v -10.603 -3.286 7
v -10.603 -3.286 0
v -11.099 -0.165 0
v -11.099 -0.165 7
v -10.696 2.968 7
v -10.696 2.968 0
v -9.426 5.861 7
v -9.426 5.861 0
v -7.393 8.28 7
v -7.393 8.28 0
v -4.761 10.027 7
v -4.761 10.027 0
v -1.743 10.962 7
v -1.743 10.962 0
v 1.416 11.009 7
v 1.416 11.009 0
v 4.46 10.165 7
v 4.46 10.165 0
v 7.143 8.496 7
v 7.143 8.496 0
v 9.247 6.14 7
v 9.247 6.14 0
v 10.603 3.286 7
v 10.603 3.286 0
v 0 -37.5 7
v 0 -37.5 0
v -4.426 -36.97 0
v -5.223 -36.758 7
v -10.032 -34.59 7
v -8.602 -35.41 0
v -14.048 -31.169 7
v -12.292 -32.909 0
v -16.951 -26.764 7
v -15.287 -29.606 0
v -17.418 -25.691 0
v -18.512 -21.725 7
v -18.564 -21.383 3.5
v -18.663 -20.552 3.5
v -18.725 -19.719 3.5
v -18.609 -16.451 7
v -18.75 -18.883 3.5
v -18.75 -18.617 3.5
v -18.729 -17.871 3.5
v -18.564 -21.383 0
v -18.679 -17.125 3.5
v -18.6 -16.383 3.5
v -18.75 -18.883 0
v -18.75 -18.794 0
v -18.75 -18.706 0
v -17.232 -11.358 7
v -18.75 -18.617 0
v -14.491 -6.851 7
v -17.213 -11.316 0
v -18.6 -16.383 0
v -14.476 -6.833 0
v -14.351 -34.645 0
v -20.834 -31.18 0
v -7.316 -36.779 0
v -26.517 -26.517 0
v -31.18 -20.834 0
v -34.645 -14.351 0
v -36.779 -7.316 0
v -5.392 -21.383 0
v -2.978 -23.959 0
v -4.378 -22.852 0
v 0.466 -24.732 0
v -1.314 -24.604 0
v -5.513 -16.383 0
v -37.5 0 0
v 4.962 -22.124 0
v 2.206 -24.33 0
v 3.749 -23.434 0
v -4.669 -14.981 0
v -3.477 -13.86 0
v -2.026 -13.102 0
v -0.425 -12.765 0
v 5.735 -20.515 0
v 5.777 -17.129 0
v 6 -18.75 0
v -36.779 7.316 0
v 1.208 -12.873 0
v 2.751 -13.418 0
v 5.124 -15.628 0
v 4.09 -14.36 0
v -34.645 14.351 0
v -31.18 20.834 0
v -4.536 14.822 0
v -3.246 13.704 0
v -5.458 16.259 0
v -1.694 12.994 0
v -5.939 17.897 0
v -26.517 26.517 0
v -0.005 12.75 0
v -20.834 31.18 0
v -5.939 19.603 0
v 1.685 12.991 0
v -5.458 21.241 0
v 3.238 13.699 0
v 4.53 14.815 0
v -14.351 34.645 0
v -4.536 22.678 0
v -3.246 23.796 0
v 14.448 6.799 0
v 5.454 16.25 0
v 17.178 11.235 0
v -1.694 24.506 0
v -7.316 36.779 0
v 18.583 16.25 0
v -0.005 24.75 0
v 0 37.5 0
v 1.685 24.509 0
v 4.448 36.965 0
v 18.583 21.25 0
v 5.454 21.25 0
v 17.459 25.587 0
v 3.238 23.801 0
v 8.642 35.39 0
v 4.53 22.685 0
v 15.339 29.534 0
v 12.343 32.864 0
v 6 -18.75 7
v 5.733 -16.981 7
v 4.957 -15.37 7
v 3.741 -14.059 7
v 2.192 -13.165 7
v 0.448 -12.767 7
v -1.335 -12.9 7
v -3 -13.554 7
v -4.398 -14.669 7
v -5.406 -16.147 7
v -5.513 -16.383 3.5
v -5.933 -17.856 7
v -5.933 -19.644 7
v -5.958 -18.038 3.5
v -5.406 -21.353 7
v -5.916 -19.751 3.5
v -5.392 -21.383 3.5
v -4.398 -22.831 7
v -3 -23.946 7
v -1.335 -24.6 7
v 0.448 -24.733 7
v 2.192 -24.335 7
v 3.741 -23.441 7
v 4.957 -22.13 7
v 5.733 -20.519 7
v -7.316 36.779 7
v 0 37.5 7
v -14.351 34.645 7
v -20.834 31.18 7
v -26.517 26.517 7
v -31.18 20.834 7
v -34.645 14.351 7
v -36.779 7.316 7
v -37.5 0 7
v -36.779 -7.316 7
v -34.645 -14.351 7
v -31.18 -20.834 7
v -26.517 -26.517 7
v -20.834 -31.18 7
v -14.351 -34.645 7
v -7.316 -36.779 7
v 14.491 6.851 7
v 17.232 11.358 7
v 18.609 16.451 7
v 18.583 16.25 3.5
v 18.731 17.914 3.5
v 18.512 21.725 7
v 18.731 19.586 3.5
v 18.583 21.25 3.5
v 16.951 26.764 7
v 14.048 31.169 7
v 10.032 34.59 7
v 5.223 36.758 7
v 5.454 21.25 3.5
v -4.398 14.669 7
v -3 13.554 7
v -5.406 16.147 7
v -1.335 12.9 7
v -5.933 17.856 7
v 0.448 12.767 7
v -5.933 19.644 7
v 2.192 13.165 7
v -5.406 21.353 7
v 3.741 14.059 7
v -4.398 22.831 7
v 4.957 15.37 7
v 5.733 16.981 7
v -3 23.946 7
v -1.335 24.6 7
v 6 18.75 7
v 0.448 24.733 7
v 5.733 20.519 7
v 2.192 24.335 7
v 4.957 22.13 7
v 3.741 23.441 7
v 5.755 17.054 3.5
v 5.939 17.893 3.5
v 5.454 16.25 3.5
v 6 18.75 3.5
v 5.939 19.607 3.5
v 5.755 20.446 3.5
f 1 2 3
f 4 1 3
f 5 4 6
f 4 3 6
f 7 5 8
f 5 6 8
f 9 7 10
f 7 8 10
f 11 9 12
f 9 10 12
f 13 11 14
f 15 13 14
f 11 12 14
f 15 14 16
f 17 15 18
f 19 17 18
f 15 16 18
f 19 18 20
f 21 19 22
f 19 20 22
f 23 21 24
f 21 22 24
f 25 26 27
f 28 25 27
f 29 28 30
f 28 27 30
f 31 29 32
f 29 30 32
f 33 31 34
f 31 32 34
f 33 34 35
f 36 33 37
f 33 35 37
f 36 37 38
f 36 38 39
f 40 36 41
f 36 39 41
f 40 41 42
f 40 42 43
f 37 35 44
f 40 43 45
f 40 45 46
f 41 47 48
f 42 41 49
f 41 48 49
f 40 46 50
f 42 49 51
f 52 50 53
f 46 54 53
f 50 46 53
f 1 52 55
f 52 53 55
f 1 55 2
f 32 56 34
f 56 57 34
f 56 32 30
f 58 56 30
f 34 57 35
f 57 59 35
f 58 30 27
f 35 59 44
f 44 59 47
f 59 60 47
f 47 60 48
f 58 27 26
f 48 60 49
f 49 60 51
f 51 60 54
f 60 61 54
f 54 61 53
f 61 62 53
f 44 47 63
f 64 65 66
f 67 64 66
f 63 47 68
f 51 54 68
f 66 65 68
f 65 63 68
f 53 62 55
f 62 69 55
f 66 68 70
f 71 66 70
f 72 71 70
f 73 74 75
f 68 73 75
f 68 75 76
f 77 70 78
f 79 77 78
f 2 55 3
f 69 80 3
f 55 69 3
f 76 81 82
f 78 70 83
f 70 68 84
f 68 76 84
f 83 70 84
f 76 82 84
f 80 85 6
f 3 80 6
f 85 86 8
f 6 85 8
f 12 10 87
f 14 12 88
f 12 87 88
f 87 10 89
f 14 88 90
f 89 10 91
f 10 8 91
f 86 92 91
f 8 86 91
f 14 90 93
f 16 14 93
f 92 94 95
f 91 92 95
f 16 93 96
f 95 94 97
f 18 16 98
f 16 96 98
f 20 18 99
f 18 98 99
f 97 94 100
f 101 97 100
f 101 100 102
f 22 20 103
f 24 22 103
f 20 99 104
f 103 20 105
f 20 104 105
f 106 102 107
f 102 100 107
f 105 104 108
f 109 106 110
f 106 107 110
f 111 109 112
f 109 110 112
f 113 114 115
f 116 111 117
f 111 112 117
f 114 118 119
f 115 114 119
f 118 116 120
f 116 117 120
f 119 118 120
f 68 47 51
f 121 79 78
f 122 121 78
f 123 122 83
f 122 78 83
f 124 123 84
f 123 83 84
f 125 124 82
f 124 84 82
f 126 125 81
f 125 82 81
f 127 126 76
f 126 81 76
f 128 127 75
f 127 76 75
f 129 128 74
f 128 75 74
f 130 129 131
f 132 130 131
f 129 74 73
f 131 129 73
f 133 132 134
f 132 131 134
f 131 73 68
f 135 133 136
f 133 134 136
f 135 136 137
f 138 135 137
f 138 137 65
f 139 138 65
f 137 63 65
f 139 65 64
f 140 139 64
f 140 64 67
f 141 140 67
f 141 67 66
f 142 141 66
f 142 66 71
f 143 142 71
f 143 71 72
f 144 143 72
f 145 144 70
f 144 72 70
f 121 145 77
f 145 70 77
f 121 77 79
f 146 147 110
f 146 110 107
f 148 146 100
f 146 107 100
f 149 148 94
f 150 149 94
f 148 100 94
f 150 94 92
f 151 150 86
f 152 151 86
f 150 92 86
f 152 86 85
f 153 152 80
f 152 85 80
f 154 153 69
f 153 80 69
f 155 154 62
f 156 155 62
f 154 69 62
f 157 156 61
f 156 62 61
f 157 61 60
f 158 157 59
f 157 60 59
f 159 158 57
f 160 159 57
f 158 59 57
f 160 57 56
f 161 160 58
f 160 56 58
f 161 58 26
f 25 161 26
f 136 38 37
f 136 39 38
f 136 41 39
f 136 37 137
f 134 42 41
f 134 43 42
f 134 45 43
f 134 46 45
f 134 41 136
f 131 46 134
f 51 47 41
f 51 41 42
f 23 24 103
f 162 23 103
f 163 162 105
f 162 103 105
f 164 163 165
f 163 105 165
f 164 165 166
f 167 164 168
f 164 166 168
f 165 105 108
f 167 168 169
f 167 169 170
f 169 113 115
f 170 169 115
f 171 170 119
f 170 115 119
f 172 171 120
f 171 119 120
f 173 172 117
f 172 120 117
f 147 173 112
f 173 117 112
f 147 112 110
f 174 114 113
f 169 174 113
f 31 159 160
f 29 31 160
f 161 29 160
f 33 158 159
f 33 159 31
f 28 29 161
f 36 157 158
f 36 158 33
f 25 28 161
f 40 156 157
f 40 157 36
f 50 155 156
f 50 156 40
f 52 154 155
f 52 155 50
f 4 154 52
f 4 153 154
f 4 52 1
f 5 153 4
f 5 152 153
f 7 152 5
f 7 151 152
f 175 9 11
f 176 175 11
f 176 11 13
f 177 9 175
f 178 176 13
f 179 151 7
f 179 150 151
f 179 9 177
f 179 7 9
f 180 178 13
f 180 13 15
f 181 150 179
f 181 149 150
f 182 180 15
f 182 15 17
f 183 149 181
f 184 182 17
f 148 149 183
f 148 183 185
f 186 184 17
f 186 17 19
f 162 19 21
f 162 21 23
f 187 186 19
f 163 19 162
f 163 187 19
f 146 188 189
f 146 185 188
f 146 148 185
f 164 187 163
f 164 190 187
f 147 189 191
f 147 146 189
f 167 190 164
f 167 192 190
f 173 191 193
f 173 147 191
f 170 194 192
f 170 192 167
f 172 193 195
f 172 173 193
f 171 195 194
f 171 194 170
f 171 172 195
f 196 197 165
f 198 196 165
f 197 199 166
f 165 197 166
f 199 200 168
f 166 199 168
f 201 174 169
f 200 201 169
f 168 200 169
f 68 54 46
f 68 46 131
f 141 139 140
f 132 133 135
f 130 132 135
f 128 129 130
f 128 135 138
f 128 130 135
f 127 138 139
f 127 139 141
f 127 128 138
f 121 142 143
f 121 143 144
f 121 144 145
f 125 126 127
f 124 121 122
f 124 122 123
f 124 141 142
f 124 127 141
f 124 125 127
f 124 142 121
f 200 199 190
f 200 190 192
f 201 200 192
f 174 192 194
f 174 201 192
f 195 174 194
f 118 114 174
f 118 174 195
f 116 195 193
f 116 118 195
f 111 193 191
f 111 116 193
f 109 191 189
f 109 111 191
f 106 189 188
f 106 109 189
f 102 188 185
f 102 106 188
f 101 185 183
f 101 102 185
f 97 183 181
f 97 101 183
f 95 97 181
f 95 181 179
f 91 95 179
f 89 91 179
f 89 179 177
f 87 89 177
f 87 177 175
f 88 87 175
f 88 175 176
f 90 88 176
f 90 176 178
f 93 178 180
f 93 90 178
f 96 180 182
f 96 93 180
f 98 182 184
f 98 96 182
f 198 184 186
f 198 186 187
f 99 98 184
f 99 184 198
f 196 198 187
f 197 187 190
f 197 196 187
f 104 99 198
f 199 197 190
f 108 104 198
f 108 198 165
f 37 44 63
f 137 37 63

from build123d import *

# Parameters (mm, degrees)
F0_R     = 6
F1_DEPTH = 7
F2_W     = 18.74953
F2_H     = 5
F3_DEPTH = 3.5
F4_W     = 22.433769
F4_H     = 5
F5_DEPTH = 3.5


with BuildPart() as f1:
    # F0 (on Top) → F1 (new body)
    with BuildSketch(Plane.XY):
        with BuildLine():
            ThreePointArc((10.602586, 3.2856), (17.909774, 24.3), (0, 37.5))
            ThreePointArc((0, 37.5), (-37.5, 0), (0, -37.5))
            ThreePointArc((0, -37.5), (-17.909774, -24.3), (-10.602586, -3.2856))
            ThreePointArc((-10.602586, -3.2856), (-3.2856, 10.602586), (10.602586, 3.2856))
        make_face()
        with Locations((0, 18.75)):
            Circle(F0_R, mode=Mode.SUBTRACT)
        with Locations((0, -18.75)):
            Circle(F0_R)
    extrude(amount=F1_DEPTH)

    # F2 (on Top) → F3 (join)
    with BuildSketch(Plane.XY):
        with Locations((-9.374765, -18.882733)):
            Rectangle(F2_W, F2_H)
    extrude(amount=F3_DEPTH)

    # F4 (on Top) → F5 (cut)
    with BuildSketch(Plane.XY):
        with Locations((11.216884, 18.75)):
            Rectangle(F4_W, F4_H)
    extrude(amount=F5_DEPTH, mode=Mode.SUBTRACT)


solid = f1.part
